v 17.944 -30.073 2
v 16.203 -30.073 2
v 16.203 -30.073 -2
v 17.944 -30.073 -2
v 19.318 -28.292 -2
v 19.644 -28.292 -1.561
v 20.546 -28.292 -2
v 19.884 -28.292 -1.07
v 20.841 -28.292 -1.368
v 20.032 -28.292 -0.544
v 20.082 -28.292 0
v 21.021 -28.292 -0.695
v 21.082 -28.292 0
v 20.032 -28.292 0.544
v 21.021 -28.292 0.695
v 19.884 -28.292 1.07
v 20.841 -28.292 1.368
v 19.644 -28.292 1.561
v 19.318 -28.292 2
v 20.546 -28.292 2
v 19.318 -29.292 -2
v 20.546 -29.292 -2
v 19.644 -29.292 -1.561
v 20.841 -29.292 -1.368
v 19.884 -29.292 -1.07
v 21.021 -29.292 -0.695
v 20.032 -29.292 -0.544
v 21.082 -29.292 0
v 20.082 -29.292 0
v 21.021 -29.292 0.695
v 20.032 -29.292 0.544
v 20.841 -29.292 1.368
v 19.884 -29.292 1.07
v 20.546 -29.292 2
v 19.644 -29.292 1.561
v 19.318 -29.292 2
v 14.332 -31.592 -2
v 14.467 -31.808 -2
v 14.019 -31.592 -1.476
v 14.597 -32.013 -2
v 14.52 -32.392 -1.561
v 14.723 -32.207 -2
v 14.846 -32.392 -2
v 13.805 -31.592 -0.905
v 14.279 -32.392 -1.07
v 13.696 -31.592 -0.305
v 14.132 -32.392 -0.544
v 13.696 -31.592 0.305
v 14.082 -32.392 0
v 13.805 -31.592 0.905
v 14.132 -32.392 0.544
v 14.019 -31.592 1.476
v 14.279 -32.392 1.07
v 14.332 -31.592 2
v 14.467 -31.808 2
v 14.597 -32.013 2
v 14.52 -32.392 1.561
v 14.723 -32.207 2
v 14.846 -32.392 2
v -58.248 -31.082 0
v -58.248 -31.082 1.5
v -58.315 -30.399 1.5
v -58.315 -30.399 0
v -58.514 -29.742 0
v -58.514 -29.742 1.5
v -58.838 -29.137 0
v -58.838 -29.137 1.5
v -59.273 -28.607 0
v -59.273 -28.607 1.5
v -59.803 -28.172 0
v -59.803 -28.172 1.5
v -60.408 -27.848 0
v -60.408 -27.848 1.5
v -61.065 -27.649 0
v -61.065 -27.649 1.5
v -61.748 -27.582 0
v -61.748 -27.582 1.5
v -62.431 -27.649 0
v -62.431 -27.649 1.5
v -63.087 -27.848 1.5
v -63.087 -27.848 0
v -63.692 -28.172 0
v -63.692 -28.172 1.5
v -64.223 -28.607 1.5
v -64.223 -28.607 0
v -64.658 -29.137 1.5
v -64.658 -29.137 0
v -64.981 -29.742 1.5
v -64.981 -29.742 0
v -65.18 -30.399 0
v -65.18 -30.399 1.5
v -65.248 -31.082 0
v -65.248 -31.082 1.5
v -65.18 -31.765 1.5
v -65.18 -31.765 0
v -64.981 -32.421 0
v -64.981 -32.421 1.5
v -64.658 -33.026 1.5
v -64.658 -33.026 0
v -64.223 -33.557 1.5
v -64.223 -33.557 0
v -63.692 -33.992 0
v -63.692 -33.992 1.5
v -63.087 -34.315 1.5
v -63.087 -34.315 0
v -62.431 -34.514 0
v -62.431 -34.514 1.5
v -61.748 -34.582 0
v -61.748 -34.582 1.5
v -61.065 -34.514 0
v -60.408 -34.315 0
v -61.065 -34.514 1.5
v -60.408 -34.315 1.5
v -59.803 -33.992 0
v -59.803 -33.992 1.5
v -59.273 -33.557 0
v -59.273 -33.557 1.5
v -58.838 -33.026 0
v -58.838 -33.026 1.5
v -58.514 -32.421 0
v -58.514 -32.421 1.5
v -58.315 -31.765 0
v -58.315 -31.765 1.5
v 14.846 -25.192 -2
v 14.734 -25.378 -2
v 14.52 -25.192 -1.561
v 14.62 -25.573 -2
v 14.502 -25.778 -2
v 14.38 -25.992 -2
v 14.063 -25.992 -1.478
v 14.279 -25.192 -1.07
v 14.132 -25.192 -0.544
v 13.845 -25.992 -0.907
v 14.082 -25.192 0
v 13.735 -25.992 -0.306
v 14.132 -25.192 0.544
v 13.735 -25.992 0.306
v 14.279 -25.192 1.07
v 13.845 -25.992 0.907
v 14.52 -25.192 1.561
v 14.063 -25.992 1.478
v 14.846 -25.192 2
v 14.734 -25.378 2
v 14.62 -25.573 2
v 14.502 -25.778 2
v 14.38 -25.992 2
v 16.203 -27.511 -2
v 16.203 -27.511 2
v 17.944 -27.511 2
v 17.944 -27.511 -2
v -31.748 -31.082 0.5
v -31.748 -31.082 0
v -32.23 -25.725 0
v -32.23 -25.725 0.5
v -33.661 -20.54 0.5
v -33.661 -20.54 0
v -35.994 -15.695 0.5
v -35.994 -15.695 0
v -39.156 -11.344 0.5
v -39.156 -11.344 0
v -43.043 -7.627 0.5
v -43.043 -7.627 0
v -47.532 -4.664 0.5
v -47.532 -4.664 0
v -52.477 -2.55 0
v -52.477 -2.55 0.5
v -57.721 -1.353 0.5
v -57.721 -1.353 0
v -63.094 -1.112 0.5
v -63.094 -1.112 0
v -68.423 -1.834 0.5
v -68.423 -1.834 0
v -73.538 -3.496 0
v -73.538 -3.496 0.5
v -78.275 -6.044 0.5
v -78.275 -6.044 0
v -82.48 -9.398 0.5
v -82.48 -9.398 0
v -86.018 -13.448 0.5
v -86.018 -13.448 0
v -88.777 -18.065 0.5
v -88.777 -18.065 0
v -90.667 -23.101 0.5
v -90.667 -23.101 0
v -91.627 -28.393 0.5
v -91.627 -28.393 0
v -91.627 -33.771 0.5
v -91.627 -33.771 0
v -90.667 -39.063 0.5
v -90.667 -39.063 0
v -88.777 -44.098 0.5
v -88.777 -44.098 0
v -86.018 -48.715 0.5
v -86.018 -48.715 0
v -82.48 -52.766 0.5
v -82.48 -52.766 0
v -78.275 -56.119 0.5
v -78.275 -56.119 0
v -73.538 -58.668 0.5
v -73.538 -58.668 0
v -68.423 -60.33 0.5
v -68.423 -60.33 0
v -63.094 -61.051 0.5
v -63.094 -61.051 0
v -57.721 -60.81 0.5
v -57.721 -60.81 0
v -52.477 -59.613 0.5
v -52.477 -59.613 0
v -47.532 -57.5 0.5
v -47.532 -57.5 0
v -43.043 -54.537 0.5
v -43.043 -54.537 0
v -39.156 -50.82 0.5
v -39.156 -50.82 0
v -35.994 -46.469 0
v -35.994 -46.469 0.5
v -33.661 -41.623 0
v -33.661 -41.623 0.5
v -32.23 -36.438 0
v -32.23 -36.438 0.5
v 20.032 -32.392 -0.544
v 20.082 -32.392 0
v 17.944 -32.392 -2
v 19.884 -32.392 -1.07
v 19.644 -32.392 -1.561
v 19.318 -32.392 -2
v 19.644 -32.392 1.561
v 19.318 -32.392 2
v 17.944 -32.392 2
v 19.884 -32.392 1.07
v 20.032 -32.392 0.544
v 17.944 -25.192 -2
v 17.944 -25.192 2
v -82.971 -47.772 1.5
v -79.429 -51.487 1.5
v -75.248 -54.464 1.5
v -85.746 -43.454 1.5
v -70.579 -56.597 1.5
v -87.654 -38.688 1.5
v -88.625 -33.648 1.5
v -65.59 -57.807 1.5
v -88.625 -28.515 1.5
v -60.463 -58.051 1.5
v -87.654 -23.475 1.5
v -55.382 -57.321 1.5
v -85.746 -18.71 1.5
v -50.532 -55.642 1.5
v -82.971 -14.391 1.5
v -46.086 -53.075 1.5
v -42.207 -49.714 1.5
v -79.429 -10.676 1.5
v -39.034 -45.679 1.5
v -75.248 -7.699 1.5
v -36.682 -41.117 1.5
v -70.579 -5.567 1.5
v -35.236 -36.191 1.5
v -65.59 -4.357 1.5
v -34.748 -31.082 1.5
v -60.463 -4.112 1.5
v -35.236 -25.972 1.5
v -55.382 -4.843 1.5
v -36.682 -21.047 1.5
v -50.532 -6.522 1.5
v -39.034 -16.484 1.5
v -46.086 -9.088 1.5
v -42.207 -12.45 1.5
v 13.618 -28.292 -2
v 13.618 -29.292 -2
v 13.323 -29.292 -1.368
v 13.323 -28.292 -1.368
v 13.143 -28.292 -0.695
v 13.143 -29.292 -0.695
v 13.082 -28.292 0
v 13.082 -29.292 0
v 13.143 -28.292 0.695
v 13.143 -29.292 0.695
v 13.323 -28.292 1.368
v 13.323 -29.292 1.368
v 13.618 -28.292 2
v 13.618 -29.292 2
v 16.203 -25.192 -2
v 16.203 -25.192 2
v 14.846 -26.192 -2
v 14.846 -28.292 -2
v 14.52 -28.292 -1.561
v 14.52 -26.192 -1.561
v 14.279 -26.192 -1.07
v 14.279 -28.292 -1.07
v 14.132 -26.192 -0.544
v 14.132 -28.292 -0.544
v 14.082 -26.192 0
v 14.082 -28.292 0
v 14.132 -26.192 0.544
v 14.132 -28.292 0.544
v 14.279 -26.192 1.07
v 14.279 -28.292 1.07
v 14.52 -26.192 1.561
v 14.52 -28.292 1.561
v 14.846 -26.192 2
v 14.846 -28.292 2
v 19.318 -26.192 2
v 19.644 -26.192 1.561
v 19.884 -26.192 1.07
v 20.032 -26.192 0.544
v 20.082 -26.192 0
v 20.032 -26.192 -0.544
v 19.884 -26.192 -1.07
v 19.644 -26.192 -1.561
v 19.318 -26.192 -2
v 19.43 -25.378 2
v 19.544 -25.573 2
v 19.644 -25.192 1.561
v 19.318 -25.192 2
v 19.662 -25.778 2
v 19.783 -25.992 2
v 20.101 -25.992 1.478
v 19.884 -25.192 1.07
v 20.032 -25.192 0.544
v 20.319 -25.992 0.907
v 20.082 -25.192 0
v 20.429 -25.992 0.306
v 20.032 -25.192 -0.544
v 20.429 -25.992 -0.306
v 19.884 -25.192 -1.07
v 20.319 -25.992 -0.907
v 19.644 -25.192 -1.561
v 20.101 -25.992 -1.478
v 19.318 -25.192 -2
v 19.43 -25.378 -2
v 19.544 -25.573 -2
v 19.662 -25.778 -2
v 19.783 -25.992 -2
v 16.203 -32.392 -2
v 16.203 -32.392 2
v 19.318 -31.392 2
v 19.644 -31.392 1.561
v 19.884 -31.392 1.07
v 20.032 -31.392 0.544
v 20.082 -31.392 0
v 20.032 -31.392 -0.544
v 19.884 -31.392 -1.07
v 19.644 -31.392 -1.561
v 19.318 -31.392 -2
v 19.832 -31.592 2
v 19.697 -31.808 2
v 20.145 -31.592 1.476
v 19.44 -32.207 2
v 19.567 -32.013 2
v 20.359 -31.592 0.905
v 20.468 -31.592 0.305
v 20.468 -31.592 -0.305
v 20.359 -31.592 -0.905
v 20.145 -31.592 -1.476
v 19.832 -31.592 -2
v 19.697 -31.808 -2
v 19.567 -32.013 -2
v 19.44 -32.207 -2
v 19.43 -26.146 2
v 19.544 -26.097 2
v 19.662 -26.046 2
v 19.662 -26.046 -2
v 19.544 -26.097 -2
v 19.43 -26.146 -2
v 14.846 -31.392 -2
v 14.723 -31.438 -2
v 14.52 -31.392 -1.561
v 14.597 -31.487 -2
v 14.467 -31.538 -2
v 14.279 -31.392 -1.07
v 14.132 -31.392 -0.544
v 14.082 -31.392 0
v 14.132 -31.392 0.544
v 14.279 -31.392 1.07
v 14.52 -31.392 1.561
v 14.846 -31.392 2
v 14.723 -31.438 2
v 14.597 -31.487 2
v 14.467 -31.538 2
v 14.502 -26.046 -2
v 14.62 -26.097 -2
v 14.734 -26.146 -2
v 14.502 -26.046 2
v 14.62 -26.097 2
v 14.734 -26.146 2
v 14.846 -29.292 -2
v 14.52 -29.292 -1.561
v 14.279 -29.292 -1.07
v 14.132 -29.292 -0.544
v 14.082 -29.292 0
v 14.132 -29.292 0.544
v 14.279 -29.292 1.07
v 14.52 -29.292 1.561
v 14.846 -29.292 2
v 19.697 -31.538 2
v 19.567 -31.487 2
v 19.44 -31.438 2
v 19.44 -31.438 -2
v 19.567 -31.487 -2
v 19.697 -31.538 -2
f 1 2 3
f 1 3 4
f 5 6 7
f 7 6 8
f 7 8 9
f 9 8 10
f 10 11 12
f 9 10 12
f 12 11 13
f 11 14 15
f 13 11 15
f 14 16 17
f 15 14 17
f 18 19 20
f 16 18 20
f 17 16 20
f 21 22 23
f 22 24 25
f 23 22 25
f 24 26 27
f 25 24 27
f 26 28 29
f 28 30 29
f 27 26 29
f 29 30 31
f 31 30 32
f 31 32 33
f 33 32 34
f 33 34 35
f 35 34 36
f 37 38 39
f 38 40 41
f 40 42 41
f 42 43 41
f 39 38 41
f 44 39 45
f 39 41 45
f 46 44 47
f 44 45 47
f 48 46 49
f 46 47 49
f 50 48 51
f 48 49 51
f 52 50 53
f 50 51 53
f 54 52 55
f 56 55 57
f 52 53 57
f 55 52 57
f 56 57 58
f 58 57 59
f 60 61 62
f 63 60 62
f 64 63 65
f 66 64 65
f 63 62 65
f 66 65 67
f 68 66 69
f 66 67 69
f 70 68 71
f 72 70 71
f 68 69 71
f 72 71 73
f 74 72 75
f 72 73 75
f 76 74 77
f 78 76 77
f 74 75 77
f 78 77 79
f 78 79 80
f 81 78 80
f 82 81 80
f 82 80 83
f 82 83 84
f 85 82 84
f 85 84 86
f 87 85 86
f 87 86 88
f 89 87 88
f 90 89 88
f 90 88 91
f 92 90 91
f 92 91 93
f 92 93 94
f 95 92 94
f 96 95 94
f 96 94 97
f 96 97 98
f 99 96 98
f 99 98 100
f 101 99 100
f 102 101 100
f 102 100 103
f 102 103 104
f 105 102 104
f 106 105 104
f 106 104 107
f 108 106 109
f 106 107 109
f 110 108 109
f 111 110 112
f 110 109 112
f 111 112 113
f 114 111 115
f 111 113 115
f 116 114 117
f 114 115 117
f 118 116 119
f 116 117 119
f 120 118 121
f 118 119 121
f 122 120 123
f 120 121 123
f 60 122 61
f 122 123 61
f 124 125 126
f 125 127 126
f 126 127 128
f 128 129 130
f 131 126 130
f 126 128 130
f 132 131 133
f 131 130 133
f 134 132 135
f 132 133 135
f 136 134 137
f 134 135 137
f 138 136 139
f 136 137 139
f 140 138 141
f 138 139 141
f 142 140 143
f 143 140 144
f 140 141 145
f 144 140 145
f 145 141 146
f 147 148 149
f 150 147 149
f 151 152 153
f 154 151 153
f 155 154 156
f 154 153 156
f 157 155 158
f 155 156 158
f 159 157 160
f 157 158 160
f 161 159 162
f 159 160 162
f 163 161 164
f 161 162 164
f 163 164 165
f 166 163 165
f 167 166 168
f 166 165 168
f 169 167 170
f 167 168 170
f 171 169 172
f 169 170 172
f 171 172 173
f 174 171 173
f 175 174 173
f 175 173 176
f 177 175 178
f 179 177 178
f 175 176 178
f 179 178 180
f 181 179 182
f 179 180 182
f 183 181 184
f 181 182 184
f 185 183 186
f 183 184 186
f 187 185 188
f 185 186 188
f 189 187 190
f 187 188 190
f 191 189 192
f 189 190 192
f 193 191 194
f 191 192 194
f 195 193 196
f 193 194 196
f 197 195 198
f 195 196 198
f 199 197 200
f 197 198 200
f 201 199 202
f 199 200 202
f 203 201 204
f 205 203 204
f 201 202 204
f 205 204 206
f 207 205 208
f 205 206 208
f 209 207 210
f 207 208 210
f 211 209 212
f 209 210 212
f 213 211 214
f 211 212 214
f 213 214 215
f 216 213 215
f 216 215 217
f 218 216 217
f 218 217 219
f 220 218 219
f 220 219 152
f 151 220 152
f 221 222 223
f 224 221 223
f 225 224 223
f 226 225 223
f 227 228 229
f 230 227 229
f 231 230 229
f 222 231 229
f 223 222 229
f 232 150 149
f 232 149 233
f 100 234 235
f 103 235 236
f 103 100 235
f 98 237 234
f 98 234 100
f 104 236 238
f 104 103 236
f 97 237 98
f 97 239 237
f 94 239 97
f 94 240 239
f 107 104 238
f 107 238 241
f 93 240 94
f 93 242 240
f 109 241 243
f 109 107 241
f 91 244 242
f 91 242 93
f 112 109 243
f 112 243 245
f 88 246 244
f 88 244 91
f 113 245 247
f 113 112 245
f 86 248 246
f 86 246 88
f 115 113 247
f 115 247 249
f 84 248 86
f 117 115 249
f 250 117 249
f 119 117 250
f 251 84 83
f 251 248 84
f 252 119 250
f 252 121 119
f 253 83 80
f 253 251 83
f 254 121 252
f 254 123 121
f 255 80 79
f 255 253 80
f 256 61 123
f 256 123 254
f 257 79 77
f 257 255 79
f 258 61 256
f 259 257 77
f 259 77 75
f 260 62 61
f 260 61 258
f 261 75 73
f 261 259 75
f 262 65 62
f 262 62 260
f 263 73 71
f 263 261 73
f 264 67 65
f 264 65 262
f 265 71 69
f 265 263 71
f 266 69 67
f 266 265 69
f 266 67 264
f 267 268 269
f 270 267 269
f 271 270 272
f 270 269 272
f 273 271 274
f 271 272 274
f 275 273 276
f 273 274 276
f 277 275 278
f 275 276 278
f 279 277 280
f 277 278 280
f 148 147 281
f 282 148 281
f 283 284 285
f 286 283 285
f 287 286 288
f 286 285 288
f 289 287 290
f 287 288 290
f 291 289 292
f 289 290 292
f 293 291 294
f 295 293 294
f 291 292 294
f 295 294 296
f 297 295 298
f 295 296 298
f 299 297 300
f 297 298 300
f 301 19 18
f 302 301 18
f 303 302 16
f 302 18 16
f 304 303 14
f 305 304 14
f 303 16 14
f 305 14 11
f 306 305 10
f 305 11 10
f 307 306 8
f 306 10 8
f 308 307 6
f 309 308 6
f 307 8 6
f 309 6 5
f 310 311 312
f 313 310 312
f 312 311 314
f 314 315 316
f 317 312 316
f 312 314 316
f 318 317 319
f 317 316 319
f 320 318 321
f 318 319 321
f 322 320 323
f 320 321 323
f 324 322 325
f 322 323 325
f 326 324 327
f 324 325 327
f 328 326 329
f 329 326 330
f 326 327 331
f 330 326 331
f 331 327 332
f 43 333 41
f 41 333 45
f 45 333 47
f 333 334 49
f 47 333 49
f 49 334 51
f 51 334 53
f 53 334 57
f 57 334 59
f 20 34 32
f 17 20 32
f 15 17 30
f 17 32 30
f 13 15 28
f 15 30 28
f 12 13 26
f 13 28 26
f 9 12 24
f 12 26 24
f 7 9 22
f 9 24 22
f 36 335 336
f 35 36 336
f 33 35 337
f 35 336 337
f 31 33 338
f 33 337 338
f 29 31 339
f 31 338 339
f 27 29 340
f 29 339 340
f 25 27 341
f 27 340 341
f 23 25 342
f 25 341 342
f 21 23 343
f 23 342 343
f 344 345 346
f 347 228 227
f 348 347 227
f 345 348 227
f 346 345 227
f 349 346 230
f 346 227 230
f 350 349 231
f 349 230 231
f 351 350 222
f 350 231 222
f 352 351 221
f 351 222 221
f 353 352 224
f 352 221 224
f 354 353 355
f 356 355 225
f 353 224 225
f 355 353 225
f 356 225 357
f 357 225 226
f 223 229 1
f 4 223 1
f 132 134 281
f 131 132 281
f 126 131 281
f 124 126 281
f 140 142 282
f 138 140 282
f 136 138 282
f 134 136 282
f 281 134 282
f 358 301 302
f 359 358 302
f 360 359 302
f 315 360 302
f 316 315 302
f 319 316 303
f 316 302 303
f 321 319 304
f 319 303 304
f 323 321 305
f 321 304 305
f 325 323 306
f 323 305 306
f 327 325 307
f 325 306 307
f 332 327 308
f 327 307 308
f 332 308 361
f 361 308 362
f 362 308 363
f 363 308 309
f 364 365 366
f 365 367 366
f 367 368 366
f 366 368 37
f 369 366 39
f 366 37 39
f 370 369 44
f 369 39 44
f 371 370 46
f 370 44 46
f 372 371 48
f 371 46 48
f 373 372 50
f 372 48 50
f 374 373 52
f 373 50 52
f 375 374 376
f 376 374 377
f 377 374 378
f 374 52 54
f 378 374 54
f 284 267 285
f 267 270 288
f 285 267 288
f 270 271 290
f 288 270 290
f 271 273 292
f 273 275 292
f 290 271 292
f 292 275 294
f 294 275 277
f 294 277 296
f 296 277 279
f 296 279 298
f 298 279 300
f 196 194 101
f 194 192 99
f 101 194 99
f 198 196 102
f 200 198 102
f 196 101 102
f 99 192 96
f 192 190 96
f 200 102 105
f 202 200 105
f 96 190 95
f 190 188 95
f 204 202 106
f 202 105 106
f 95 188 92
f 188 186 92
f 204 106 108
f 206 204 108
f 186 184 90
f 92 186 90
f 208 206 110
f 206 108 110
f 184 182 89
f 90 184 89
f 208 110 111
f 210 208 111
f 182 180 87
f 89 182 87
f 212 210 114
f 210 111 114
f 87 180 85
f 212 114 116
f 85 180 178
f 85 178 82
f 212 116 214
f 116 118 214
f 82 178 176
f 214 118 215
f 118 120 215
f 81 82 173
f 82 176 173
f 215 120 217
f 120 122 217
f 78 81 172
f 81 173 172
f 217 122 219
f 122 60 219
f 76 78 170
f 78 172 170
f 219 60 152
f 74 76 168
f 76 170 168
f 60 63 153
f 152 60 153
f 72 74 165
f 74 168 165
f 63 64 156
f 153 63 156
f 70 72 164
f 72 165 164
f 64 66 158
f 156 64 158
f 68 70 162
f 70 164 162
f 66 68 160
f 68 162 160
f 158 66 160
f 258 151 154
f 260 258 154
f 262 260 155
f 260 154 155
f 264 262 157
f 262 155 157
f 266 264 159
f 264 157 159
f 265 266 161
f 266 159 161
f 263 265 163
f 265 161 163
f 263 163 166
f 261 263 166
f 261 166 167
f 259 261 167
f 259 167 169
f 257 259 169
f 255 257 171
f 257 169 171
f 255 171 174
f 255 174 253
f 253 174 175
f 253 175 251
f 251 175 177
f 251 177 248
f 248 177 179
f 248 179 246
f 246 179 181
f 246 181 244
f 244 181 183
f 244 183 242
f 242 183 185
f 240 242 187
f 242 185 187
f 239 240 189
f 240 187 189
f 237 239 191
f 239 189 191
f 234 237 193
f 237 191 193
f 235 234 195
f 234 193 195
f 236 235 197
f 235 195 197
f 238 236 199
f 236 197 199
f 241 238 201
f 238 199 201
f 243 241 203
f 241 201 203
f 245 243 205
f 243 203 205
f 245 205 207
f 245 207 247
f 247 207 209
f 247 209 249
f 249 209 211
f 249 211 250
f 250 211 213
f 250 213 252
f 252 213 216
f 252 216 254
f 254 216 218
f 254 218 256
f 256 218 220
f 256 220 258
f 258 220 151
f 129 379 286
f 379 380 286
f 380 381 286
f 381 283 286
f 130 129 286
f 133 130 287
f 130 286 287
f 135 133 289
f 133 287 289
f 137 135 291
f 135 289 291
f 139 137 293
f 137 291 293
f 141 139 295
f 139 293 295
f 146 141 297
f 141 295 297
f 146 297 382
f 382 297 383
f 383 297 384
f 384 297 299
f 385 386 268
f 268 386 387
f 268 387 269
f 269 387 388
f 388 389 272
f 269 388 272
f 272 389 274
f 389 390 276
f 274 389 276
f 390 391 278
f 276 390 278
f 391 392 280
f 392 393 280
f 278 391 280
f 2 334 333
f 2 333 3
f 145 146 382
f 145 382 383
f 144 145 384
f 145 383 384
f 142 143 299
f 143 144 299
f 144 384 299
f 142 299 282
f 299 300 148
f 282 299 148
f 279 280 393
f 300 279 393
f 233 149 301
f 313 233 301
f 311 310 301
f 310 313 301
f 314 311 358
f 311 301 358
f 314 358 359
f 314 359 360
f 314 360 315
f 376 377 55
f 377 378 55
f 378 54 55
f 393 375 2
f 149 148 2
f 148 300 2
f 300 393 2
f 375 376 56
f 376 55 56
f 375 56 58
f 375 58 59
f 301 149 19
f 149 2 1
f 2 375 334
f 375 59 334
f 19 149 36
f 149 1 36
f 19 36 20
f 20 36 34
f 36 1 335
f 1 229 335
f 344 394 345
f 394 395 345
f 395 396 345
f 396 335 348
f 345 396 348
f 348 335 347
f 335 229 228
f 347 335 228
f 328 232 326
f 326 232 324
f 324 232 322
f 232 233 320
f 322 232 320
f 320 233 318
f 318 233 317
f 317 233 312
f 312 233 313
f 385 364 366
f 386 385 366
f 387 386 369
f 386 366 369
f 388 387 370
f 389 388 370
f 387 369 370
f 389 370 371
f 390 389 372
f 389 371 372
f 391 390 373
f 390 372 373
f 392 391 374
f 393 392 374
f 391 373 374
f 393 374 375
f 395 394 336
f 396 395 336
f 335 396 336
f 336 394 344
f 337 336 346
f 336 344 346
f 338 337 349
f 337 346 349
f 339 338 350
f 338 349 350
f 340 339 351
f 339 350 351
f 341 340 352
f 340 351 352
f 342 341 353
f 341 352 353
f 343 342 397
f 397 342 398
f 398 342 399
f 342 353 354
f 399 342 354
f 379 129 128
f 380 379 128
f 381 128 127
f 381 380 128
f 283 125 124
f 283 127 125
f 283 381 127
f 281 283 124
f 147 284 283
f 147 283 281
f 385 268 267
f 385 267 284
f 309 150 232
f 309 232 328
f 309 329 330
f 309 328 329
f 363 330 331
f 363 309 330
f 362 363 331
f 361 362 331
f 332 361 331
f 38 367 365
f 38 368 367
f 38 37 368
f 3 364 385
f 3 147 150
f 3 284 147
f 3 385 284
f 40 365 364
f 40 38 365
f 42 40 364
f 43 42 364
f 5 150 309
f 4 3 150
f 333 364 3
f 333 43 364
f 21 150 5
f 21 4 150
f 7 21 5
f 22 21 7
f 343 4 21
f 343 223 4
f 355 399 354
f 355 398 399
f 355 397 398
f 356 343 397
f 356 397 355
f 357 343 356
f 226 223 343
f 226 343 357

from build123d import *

# Parameters (mm, degrees)
F1_R      = 30
F2_DEPTH  = 1.5
F3_R      = 3.5
F4_DEPTH  = 25
F5_SIZE2  = 1
F5_SIZE   = 3
F8_W      = 9
F8_H      = 8
F8_W_2    = 8
F8_H_2    = 4
F9_DEPTH  = 25
F10_W     = 1.7410665751
F10_H     = 2.3193174853
F11_DEPTH = 25


with BuildPart() as f2:
    # F1 (on Top) → F2 (new body)
    with BuildSketch(Plane.XY):
        with Locations((-61.7477148771, -31.0816839337)):
            Circle(F1_R)
    extrude(amount=F2_DEPTH)

    # F3 (on face) → F4 (cut)
    with BuildSketch(Plane.XY.offset(1.5)):
        with Locations((-61.7477148771, -31.0816839337)):
            Circle(F3_R)
    extrude(amount=-F4_DEPTH, mode=Mode.SUBTRACT)

    # F5
    f5_edges = [f2.edges().sort_by_distance(p)[0] for p in [
        (-91.747715, -31.081684, 1.5),
    ]]
    f5_side = f2.faces().sort_by_distance((-90.899187, -31.081684, 1.5))[0]
    chamfer(f5_edges, length=F5_SIZE, length2=F5_SIZE2, reference=f5_side)


with BuildPart() as f7:
    # F6 (on Top) → F7 (revolve)
    with BuildSketch(Plane.XY):
        Polygon((14.081964633, -25.1921089872), (13.7207033594, -25.9921089872), (14.081964633, -26.1921089872), (14.081964633, -28.2921089872), (13.081964633, -28.2921089872), (13.081964633, -29.2921089872), (14.081964633, -29.2921089872), (14.081964633, -31.3921089872), (13.681964633, -31.5921089872), (14.081964633, -32.3921089872), (17.081964633, -32.3921089872), (17.081964633, -25.1921089872), align=None)
    revolve(axis=Axis((17.081964633, -28.7921089872, 0), (0, 1, 0)))

    # F8 (on face) → F9 (cut)
    with BuildSketch(Plane.XZ.offset(32.3921089872)):
        with Locations((17.081964633, 0)):
            Rectangle(F8_W, F8_H)
        with Locations((17.081964633, 0)):
            Rectangle(F8_W_2, F8_H_2, mode=Mode.SUBTRACT)
    extrude(amount=-F9_DEPTH, mode=Mode.SUBTRACT)

    # F10 (on face) → F11 (cut)
    with BuildSketch(Plane.XY.offset(2)):
        with Locations((17.0735940337, -26.3517677299)):
            Rectangle(F10_W, F10_H)
        with Locations((17.0735940337, -31.2324502445)):
            Rectangle(F10_W, F10_H)
    extrude(amount=-F11_DEPTH, mode=Mode.SUBTRACT)


solid = Compound([f2.part, f7.part])
